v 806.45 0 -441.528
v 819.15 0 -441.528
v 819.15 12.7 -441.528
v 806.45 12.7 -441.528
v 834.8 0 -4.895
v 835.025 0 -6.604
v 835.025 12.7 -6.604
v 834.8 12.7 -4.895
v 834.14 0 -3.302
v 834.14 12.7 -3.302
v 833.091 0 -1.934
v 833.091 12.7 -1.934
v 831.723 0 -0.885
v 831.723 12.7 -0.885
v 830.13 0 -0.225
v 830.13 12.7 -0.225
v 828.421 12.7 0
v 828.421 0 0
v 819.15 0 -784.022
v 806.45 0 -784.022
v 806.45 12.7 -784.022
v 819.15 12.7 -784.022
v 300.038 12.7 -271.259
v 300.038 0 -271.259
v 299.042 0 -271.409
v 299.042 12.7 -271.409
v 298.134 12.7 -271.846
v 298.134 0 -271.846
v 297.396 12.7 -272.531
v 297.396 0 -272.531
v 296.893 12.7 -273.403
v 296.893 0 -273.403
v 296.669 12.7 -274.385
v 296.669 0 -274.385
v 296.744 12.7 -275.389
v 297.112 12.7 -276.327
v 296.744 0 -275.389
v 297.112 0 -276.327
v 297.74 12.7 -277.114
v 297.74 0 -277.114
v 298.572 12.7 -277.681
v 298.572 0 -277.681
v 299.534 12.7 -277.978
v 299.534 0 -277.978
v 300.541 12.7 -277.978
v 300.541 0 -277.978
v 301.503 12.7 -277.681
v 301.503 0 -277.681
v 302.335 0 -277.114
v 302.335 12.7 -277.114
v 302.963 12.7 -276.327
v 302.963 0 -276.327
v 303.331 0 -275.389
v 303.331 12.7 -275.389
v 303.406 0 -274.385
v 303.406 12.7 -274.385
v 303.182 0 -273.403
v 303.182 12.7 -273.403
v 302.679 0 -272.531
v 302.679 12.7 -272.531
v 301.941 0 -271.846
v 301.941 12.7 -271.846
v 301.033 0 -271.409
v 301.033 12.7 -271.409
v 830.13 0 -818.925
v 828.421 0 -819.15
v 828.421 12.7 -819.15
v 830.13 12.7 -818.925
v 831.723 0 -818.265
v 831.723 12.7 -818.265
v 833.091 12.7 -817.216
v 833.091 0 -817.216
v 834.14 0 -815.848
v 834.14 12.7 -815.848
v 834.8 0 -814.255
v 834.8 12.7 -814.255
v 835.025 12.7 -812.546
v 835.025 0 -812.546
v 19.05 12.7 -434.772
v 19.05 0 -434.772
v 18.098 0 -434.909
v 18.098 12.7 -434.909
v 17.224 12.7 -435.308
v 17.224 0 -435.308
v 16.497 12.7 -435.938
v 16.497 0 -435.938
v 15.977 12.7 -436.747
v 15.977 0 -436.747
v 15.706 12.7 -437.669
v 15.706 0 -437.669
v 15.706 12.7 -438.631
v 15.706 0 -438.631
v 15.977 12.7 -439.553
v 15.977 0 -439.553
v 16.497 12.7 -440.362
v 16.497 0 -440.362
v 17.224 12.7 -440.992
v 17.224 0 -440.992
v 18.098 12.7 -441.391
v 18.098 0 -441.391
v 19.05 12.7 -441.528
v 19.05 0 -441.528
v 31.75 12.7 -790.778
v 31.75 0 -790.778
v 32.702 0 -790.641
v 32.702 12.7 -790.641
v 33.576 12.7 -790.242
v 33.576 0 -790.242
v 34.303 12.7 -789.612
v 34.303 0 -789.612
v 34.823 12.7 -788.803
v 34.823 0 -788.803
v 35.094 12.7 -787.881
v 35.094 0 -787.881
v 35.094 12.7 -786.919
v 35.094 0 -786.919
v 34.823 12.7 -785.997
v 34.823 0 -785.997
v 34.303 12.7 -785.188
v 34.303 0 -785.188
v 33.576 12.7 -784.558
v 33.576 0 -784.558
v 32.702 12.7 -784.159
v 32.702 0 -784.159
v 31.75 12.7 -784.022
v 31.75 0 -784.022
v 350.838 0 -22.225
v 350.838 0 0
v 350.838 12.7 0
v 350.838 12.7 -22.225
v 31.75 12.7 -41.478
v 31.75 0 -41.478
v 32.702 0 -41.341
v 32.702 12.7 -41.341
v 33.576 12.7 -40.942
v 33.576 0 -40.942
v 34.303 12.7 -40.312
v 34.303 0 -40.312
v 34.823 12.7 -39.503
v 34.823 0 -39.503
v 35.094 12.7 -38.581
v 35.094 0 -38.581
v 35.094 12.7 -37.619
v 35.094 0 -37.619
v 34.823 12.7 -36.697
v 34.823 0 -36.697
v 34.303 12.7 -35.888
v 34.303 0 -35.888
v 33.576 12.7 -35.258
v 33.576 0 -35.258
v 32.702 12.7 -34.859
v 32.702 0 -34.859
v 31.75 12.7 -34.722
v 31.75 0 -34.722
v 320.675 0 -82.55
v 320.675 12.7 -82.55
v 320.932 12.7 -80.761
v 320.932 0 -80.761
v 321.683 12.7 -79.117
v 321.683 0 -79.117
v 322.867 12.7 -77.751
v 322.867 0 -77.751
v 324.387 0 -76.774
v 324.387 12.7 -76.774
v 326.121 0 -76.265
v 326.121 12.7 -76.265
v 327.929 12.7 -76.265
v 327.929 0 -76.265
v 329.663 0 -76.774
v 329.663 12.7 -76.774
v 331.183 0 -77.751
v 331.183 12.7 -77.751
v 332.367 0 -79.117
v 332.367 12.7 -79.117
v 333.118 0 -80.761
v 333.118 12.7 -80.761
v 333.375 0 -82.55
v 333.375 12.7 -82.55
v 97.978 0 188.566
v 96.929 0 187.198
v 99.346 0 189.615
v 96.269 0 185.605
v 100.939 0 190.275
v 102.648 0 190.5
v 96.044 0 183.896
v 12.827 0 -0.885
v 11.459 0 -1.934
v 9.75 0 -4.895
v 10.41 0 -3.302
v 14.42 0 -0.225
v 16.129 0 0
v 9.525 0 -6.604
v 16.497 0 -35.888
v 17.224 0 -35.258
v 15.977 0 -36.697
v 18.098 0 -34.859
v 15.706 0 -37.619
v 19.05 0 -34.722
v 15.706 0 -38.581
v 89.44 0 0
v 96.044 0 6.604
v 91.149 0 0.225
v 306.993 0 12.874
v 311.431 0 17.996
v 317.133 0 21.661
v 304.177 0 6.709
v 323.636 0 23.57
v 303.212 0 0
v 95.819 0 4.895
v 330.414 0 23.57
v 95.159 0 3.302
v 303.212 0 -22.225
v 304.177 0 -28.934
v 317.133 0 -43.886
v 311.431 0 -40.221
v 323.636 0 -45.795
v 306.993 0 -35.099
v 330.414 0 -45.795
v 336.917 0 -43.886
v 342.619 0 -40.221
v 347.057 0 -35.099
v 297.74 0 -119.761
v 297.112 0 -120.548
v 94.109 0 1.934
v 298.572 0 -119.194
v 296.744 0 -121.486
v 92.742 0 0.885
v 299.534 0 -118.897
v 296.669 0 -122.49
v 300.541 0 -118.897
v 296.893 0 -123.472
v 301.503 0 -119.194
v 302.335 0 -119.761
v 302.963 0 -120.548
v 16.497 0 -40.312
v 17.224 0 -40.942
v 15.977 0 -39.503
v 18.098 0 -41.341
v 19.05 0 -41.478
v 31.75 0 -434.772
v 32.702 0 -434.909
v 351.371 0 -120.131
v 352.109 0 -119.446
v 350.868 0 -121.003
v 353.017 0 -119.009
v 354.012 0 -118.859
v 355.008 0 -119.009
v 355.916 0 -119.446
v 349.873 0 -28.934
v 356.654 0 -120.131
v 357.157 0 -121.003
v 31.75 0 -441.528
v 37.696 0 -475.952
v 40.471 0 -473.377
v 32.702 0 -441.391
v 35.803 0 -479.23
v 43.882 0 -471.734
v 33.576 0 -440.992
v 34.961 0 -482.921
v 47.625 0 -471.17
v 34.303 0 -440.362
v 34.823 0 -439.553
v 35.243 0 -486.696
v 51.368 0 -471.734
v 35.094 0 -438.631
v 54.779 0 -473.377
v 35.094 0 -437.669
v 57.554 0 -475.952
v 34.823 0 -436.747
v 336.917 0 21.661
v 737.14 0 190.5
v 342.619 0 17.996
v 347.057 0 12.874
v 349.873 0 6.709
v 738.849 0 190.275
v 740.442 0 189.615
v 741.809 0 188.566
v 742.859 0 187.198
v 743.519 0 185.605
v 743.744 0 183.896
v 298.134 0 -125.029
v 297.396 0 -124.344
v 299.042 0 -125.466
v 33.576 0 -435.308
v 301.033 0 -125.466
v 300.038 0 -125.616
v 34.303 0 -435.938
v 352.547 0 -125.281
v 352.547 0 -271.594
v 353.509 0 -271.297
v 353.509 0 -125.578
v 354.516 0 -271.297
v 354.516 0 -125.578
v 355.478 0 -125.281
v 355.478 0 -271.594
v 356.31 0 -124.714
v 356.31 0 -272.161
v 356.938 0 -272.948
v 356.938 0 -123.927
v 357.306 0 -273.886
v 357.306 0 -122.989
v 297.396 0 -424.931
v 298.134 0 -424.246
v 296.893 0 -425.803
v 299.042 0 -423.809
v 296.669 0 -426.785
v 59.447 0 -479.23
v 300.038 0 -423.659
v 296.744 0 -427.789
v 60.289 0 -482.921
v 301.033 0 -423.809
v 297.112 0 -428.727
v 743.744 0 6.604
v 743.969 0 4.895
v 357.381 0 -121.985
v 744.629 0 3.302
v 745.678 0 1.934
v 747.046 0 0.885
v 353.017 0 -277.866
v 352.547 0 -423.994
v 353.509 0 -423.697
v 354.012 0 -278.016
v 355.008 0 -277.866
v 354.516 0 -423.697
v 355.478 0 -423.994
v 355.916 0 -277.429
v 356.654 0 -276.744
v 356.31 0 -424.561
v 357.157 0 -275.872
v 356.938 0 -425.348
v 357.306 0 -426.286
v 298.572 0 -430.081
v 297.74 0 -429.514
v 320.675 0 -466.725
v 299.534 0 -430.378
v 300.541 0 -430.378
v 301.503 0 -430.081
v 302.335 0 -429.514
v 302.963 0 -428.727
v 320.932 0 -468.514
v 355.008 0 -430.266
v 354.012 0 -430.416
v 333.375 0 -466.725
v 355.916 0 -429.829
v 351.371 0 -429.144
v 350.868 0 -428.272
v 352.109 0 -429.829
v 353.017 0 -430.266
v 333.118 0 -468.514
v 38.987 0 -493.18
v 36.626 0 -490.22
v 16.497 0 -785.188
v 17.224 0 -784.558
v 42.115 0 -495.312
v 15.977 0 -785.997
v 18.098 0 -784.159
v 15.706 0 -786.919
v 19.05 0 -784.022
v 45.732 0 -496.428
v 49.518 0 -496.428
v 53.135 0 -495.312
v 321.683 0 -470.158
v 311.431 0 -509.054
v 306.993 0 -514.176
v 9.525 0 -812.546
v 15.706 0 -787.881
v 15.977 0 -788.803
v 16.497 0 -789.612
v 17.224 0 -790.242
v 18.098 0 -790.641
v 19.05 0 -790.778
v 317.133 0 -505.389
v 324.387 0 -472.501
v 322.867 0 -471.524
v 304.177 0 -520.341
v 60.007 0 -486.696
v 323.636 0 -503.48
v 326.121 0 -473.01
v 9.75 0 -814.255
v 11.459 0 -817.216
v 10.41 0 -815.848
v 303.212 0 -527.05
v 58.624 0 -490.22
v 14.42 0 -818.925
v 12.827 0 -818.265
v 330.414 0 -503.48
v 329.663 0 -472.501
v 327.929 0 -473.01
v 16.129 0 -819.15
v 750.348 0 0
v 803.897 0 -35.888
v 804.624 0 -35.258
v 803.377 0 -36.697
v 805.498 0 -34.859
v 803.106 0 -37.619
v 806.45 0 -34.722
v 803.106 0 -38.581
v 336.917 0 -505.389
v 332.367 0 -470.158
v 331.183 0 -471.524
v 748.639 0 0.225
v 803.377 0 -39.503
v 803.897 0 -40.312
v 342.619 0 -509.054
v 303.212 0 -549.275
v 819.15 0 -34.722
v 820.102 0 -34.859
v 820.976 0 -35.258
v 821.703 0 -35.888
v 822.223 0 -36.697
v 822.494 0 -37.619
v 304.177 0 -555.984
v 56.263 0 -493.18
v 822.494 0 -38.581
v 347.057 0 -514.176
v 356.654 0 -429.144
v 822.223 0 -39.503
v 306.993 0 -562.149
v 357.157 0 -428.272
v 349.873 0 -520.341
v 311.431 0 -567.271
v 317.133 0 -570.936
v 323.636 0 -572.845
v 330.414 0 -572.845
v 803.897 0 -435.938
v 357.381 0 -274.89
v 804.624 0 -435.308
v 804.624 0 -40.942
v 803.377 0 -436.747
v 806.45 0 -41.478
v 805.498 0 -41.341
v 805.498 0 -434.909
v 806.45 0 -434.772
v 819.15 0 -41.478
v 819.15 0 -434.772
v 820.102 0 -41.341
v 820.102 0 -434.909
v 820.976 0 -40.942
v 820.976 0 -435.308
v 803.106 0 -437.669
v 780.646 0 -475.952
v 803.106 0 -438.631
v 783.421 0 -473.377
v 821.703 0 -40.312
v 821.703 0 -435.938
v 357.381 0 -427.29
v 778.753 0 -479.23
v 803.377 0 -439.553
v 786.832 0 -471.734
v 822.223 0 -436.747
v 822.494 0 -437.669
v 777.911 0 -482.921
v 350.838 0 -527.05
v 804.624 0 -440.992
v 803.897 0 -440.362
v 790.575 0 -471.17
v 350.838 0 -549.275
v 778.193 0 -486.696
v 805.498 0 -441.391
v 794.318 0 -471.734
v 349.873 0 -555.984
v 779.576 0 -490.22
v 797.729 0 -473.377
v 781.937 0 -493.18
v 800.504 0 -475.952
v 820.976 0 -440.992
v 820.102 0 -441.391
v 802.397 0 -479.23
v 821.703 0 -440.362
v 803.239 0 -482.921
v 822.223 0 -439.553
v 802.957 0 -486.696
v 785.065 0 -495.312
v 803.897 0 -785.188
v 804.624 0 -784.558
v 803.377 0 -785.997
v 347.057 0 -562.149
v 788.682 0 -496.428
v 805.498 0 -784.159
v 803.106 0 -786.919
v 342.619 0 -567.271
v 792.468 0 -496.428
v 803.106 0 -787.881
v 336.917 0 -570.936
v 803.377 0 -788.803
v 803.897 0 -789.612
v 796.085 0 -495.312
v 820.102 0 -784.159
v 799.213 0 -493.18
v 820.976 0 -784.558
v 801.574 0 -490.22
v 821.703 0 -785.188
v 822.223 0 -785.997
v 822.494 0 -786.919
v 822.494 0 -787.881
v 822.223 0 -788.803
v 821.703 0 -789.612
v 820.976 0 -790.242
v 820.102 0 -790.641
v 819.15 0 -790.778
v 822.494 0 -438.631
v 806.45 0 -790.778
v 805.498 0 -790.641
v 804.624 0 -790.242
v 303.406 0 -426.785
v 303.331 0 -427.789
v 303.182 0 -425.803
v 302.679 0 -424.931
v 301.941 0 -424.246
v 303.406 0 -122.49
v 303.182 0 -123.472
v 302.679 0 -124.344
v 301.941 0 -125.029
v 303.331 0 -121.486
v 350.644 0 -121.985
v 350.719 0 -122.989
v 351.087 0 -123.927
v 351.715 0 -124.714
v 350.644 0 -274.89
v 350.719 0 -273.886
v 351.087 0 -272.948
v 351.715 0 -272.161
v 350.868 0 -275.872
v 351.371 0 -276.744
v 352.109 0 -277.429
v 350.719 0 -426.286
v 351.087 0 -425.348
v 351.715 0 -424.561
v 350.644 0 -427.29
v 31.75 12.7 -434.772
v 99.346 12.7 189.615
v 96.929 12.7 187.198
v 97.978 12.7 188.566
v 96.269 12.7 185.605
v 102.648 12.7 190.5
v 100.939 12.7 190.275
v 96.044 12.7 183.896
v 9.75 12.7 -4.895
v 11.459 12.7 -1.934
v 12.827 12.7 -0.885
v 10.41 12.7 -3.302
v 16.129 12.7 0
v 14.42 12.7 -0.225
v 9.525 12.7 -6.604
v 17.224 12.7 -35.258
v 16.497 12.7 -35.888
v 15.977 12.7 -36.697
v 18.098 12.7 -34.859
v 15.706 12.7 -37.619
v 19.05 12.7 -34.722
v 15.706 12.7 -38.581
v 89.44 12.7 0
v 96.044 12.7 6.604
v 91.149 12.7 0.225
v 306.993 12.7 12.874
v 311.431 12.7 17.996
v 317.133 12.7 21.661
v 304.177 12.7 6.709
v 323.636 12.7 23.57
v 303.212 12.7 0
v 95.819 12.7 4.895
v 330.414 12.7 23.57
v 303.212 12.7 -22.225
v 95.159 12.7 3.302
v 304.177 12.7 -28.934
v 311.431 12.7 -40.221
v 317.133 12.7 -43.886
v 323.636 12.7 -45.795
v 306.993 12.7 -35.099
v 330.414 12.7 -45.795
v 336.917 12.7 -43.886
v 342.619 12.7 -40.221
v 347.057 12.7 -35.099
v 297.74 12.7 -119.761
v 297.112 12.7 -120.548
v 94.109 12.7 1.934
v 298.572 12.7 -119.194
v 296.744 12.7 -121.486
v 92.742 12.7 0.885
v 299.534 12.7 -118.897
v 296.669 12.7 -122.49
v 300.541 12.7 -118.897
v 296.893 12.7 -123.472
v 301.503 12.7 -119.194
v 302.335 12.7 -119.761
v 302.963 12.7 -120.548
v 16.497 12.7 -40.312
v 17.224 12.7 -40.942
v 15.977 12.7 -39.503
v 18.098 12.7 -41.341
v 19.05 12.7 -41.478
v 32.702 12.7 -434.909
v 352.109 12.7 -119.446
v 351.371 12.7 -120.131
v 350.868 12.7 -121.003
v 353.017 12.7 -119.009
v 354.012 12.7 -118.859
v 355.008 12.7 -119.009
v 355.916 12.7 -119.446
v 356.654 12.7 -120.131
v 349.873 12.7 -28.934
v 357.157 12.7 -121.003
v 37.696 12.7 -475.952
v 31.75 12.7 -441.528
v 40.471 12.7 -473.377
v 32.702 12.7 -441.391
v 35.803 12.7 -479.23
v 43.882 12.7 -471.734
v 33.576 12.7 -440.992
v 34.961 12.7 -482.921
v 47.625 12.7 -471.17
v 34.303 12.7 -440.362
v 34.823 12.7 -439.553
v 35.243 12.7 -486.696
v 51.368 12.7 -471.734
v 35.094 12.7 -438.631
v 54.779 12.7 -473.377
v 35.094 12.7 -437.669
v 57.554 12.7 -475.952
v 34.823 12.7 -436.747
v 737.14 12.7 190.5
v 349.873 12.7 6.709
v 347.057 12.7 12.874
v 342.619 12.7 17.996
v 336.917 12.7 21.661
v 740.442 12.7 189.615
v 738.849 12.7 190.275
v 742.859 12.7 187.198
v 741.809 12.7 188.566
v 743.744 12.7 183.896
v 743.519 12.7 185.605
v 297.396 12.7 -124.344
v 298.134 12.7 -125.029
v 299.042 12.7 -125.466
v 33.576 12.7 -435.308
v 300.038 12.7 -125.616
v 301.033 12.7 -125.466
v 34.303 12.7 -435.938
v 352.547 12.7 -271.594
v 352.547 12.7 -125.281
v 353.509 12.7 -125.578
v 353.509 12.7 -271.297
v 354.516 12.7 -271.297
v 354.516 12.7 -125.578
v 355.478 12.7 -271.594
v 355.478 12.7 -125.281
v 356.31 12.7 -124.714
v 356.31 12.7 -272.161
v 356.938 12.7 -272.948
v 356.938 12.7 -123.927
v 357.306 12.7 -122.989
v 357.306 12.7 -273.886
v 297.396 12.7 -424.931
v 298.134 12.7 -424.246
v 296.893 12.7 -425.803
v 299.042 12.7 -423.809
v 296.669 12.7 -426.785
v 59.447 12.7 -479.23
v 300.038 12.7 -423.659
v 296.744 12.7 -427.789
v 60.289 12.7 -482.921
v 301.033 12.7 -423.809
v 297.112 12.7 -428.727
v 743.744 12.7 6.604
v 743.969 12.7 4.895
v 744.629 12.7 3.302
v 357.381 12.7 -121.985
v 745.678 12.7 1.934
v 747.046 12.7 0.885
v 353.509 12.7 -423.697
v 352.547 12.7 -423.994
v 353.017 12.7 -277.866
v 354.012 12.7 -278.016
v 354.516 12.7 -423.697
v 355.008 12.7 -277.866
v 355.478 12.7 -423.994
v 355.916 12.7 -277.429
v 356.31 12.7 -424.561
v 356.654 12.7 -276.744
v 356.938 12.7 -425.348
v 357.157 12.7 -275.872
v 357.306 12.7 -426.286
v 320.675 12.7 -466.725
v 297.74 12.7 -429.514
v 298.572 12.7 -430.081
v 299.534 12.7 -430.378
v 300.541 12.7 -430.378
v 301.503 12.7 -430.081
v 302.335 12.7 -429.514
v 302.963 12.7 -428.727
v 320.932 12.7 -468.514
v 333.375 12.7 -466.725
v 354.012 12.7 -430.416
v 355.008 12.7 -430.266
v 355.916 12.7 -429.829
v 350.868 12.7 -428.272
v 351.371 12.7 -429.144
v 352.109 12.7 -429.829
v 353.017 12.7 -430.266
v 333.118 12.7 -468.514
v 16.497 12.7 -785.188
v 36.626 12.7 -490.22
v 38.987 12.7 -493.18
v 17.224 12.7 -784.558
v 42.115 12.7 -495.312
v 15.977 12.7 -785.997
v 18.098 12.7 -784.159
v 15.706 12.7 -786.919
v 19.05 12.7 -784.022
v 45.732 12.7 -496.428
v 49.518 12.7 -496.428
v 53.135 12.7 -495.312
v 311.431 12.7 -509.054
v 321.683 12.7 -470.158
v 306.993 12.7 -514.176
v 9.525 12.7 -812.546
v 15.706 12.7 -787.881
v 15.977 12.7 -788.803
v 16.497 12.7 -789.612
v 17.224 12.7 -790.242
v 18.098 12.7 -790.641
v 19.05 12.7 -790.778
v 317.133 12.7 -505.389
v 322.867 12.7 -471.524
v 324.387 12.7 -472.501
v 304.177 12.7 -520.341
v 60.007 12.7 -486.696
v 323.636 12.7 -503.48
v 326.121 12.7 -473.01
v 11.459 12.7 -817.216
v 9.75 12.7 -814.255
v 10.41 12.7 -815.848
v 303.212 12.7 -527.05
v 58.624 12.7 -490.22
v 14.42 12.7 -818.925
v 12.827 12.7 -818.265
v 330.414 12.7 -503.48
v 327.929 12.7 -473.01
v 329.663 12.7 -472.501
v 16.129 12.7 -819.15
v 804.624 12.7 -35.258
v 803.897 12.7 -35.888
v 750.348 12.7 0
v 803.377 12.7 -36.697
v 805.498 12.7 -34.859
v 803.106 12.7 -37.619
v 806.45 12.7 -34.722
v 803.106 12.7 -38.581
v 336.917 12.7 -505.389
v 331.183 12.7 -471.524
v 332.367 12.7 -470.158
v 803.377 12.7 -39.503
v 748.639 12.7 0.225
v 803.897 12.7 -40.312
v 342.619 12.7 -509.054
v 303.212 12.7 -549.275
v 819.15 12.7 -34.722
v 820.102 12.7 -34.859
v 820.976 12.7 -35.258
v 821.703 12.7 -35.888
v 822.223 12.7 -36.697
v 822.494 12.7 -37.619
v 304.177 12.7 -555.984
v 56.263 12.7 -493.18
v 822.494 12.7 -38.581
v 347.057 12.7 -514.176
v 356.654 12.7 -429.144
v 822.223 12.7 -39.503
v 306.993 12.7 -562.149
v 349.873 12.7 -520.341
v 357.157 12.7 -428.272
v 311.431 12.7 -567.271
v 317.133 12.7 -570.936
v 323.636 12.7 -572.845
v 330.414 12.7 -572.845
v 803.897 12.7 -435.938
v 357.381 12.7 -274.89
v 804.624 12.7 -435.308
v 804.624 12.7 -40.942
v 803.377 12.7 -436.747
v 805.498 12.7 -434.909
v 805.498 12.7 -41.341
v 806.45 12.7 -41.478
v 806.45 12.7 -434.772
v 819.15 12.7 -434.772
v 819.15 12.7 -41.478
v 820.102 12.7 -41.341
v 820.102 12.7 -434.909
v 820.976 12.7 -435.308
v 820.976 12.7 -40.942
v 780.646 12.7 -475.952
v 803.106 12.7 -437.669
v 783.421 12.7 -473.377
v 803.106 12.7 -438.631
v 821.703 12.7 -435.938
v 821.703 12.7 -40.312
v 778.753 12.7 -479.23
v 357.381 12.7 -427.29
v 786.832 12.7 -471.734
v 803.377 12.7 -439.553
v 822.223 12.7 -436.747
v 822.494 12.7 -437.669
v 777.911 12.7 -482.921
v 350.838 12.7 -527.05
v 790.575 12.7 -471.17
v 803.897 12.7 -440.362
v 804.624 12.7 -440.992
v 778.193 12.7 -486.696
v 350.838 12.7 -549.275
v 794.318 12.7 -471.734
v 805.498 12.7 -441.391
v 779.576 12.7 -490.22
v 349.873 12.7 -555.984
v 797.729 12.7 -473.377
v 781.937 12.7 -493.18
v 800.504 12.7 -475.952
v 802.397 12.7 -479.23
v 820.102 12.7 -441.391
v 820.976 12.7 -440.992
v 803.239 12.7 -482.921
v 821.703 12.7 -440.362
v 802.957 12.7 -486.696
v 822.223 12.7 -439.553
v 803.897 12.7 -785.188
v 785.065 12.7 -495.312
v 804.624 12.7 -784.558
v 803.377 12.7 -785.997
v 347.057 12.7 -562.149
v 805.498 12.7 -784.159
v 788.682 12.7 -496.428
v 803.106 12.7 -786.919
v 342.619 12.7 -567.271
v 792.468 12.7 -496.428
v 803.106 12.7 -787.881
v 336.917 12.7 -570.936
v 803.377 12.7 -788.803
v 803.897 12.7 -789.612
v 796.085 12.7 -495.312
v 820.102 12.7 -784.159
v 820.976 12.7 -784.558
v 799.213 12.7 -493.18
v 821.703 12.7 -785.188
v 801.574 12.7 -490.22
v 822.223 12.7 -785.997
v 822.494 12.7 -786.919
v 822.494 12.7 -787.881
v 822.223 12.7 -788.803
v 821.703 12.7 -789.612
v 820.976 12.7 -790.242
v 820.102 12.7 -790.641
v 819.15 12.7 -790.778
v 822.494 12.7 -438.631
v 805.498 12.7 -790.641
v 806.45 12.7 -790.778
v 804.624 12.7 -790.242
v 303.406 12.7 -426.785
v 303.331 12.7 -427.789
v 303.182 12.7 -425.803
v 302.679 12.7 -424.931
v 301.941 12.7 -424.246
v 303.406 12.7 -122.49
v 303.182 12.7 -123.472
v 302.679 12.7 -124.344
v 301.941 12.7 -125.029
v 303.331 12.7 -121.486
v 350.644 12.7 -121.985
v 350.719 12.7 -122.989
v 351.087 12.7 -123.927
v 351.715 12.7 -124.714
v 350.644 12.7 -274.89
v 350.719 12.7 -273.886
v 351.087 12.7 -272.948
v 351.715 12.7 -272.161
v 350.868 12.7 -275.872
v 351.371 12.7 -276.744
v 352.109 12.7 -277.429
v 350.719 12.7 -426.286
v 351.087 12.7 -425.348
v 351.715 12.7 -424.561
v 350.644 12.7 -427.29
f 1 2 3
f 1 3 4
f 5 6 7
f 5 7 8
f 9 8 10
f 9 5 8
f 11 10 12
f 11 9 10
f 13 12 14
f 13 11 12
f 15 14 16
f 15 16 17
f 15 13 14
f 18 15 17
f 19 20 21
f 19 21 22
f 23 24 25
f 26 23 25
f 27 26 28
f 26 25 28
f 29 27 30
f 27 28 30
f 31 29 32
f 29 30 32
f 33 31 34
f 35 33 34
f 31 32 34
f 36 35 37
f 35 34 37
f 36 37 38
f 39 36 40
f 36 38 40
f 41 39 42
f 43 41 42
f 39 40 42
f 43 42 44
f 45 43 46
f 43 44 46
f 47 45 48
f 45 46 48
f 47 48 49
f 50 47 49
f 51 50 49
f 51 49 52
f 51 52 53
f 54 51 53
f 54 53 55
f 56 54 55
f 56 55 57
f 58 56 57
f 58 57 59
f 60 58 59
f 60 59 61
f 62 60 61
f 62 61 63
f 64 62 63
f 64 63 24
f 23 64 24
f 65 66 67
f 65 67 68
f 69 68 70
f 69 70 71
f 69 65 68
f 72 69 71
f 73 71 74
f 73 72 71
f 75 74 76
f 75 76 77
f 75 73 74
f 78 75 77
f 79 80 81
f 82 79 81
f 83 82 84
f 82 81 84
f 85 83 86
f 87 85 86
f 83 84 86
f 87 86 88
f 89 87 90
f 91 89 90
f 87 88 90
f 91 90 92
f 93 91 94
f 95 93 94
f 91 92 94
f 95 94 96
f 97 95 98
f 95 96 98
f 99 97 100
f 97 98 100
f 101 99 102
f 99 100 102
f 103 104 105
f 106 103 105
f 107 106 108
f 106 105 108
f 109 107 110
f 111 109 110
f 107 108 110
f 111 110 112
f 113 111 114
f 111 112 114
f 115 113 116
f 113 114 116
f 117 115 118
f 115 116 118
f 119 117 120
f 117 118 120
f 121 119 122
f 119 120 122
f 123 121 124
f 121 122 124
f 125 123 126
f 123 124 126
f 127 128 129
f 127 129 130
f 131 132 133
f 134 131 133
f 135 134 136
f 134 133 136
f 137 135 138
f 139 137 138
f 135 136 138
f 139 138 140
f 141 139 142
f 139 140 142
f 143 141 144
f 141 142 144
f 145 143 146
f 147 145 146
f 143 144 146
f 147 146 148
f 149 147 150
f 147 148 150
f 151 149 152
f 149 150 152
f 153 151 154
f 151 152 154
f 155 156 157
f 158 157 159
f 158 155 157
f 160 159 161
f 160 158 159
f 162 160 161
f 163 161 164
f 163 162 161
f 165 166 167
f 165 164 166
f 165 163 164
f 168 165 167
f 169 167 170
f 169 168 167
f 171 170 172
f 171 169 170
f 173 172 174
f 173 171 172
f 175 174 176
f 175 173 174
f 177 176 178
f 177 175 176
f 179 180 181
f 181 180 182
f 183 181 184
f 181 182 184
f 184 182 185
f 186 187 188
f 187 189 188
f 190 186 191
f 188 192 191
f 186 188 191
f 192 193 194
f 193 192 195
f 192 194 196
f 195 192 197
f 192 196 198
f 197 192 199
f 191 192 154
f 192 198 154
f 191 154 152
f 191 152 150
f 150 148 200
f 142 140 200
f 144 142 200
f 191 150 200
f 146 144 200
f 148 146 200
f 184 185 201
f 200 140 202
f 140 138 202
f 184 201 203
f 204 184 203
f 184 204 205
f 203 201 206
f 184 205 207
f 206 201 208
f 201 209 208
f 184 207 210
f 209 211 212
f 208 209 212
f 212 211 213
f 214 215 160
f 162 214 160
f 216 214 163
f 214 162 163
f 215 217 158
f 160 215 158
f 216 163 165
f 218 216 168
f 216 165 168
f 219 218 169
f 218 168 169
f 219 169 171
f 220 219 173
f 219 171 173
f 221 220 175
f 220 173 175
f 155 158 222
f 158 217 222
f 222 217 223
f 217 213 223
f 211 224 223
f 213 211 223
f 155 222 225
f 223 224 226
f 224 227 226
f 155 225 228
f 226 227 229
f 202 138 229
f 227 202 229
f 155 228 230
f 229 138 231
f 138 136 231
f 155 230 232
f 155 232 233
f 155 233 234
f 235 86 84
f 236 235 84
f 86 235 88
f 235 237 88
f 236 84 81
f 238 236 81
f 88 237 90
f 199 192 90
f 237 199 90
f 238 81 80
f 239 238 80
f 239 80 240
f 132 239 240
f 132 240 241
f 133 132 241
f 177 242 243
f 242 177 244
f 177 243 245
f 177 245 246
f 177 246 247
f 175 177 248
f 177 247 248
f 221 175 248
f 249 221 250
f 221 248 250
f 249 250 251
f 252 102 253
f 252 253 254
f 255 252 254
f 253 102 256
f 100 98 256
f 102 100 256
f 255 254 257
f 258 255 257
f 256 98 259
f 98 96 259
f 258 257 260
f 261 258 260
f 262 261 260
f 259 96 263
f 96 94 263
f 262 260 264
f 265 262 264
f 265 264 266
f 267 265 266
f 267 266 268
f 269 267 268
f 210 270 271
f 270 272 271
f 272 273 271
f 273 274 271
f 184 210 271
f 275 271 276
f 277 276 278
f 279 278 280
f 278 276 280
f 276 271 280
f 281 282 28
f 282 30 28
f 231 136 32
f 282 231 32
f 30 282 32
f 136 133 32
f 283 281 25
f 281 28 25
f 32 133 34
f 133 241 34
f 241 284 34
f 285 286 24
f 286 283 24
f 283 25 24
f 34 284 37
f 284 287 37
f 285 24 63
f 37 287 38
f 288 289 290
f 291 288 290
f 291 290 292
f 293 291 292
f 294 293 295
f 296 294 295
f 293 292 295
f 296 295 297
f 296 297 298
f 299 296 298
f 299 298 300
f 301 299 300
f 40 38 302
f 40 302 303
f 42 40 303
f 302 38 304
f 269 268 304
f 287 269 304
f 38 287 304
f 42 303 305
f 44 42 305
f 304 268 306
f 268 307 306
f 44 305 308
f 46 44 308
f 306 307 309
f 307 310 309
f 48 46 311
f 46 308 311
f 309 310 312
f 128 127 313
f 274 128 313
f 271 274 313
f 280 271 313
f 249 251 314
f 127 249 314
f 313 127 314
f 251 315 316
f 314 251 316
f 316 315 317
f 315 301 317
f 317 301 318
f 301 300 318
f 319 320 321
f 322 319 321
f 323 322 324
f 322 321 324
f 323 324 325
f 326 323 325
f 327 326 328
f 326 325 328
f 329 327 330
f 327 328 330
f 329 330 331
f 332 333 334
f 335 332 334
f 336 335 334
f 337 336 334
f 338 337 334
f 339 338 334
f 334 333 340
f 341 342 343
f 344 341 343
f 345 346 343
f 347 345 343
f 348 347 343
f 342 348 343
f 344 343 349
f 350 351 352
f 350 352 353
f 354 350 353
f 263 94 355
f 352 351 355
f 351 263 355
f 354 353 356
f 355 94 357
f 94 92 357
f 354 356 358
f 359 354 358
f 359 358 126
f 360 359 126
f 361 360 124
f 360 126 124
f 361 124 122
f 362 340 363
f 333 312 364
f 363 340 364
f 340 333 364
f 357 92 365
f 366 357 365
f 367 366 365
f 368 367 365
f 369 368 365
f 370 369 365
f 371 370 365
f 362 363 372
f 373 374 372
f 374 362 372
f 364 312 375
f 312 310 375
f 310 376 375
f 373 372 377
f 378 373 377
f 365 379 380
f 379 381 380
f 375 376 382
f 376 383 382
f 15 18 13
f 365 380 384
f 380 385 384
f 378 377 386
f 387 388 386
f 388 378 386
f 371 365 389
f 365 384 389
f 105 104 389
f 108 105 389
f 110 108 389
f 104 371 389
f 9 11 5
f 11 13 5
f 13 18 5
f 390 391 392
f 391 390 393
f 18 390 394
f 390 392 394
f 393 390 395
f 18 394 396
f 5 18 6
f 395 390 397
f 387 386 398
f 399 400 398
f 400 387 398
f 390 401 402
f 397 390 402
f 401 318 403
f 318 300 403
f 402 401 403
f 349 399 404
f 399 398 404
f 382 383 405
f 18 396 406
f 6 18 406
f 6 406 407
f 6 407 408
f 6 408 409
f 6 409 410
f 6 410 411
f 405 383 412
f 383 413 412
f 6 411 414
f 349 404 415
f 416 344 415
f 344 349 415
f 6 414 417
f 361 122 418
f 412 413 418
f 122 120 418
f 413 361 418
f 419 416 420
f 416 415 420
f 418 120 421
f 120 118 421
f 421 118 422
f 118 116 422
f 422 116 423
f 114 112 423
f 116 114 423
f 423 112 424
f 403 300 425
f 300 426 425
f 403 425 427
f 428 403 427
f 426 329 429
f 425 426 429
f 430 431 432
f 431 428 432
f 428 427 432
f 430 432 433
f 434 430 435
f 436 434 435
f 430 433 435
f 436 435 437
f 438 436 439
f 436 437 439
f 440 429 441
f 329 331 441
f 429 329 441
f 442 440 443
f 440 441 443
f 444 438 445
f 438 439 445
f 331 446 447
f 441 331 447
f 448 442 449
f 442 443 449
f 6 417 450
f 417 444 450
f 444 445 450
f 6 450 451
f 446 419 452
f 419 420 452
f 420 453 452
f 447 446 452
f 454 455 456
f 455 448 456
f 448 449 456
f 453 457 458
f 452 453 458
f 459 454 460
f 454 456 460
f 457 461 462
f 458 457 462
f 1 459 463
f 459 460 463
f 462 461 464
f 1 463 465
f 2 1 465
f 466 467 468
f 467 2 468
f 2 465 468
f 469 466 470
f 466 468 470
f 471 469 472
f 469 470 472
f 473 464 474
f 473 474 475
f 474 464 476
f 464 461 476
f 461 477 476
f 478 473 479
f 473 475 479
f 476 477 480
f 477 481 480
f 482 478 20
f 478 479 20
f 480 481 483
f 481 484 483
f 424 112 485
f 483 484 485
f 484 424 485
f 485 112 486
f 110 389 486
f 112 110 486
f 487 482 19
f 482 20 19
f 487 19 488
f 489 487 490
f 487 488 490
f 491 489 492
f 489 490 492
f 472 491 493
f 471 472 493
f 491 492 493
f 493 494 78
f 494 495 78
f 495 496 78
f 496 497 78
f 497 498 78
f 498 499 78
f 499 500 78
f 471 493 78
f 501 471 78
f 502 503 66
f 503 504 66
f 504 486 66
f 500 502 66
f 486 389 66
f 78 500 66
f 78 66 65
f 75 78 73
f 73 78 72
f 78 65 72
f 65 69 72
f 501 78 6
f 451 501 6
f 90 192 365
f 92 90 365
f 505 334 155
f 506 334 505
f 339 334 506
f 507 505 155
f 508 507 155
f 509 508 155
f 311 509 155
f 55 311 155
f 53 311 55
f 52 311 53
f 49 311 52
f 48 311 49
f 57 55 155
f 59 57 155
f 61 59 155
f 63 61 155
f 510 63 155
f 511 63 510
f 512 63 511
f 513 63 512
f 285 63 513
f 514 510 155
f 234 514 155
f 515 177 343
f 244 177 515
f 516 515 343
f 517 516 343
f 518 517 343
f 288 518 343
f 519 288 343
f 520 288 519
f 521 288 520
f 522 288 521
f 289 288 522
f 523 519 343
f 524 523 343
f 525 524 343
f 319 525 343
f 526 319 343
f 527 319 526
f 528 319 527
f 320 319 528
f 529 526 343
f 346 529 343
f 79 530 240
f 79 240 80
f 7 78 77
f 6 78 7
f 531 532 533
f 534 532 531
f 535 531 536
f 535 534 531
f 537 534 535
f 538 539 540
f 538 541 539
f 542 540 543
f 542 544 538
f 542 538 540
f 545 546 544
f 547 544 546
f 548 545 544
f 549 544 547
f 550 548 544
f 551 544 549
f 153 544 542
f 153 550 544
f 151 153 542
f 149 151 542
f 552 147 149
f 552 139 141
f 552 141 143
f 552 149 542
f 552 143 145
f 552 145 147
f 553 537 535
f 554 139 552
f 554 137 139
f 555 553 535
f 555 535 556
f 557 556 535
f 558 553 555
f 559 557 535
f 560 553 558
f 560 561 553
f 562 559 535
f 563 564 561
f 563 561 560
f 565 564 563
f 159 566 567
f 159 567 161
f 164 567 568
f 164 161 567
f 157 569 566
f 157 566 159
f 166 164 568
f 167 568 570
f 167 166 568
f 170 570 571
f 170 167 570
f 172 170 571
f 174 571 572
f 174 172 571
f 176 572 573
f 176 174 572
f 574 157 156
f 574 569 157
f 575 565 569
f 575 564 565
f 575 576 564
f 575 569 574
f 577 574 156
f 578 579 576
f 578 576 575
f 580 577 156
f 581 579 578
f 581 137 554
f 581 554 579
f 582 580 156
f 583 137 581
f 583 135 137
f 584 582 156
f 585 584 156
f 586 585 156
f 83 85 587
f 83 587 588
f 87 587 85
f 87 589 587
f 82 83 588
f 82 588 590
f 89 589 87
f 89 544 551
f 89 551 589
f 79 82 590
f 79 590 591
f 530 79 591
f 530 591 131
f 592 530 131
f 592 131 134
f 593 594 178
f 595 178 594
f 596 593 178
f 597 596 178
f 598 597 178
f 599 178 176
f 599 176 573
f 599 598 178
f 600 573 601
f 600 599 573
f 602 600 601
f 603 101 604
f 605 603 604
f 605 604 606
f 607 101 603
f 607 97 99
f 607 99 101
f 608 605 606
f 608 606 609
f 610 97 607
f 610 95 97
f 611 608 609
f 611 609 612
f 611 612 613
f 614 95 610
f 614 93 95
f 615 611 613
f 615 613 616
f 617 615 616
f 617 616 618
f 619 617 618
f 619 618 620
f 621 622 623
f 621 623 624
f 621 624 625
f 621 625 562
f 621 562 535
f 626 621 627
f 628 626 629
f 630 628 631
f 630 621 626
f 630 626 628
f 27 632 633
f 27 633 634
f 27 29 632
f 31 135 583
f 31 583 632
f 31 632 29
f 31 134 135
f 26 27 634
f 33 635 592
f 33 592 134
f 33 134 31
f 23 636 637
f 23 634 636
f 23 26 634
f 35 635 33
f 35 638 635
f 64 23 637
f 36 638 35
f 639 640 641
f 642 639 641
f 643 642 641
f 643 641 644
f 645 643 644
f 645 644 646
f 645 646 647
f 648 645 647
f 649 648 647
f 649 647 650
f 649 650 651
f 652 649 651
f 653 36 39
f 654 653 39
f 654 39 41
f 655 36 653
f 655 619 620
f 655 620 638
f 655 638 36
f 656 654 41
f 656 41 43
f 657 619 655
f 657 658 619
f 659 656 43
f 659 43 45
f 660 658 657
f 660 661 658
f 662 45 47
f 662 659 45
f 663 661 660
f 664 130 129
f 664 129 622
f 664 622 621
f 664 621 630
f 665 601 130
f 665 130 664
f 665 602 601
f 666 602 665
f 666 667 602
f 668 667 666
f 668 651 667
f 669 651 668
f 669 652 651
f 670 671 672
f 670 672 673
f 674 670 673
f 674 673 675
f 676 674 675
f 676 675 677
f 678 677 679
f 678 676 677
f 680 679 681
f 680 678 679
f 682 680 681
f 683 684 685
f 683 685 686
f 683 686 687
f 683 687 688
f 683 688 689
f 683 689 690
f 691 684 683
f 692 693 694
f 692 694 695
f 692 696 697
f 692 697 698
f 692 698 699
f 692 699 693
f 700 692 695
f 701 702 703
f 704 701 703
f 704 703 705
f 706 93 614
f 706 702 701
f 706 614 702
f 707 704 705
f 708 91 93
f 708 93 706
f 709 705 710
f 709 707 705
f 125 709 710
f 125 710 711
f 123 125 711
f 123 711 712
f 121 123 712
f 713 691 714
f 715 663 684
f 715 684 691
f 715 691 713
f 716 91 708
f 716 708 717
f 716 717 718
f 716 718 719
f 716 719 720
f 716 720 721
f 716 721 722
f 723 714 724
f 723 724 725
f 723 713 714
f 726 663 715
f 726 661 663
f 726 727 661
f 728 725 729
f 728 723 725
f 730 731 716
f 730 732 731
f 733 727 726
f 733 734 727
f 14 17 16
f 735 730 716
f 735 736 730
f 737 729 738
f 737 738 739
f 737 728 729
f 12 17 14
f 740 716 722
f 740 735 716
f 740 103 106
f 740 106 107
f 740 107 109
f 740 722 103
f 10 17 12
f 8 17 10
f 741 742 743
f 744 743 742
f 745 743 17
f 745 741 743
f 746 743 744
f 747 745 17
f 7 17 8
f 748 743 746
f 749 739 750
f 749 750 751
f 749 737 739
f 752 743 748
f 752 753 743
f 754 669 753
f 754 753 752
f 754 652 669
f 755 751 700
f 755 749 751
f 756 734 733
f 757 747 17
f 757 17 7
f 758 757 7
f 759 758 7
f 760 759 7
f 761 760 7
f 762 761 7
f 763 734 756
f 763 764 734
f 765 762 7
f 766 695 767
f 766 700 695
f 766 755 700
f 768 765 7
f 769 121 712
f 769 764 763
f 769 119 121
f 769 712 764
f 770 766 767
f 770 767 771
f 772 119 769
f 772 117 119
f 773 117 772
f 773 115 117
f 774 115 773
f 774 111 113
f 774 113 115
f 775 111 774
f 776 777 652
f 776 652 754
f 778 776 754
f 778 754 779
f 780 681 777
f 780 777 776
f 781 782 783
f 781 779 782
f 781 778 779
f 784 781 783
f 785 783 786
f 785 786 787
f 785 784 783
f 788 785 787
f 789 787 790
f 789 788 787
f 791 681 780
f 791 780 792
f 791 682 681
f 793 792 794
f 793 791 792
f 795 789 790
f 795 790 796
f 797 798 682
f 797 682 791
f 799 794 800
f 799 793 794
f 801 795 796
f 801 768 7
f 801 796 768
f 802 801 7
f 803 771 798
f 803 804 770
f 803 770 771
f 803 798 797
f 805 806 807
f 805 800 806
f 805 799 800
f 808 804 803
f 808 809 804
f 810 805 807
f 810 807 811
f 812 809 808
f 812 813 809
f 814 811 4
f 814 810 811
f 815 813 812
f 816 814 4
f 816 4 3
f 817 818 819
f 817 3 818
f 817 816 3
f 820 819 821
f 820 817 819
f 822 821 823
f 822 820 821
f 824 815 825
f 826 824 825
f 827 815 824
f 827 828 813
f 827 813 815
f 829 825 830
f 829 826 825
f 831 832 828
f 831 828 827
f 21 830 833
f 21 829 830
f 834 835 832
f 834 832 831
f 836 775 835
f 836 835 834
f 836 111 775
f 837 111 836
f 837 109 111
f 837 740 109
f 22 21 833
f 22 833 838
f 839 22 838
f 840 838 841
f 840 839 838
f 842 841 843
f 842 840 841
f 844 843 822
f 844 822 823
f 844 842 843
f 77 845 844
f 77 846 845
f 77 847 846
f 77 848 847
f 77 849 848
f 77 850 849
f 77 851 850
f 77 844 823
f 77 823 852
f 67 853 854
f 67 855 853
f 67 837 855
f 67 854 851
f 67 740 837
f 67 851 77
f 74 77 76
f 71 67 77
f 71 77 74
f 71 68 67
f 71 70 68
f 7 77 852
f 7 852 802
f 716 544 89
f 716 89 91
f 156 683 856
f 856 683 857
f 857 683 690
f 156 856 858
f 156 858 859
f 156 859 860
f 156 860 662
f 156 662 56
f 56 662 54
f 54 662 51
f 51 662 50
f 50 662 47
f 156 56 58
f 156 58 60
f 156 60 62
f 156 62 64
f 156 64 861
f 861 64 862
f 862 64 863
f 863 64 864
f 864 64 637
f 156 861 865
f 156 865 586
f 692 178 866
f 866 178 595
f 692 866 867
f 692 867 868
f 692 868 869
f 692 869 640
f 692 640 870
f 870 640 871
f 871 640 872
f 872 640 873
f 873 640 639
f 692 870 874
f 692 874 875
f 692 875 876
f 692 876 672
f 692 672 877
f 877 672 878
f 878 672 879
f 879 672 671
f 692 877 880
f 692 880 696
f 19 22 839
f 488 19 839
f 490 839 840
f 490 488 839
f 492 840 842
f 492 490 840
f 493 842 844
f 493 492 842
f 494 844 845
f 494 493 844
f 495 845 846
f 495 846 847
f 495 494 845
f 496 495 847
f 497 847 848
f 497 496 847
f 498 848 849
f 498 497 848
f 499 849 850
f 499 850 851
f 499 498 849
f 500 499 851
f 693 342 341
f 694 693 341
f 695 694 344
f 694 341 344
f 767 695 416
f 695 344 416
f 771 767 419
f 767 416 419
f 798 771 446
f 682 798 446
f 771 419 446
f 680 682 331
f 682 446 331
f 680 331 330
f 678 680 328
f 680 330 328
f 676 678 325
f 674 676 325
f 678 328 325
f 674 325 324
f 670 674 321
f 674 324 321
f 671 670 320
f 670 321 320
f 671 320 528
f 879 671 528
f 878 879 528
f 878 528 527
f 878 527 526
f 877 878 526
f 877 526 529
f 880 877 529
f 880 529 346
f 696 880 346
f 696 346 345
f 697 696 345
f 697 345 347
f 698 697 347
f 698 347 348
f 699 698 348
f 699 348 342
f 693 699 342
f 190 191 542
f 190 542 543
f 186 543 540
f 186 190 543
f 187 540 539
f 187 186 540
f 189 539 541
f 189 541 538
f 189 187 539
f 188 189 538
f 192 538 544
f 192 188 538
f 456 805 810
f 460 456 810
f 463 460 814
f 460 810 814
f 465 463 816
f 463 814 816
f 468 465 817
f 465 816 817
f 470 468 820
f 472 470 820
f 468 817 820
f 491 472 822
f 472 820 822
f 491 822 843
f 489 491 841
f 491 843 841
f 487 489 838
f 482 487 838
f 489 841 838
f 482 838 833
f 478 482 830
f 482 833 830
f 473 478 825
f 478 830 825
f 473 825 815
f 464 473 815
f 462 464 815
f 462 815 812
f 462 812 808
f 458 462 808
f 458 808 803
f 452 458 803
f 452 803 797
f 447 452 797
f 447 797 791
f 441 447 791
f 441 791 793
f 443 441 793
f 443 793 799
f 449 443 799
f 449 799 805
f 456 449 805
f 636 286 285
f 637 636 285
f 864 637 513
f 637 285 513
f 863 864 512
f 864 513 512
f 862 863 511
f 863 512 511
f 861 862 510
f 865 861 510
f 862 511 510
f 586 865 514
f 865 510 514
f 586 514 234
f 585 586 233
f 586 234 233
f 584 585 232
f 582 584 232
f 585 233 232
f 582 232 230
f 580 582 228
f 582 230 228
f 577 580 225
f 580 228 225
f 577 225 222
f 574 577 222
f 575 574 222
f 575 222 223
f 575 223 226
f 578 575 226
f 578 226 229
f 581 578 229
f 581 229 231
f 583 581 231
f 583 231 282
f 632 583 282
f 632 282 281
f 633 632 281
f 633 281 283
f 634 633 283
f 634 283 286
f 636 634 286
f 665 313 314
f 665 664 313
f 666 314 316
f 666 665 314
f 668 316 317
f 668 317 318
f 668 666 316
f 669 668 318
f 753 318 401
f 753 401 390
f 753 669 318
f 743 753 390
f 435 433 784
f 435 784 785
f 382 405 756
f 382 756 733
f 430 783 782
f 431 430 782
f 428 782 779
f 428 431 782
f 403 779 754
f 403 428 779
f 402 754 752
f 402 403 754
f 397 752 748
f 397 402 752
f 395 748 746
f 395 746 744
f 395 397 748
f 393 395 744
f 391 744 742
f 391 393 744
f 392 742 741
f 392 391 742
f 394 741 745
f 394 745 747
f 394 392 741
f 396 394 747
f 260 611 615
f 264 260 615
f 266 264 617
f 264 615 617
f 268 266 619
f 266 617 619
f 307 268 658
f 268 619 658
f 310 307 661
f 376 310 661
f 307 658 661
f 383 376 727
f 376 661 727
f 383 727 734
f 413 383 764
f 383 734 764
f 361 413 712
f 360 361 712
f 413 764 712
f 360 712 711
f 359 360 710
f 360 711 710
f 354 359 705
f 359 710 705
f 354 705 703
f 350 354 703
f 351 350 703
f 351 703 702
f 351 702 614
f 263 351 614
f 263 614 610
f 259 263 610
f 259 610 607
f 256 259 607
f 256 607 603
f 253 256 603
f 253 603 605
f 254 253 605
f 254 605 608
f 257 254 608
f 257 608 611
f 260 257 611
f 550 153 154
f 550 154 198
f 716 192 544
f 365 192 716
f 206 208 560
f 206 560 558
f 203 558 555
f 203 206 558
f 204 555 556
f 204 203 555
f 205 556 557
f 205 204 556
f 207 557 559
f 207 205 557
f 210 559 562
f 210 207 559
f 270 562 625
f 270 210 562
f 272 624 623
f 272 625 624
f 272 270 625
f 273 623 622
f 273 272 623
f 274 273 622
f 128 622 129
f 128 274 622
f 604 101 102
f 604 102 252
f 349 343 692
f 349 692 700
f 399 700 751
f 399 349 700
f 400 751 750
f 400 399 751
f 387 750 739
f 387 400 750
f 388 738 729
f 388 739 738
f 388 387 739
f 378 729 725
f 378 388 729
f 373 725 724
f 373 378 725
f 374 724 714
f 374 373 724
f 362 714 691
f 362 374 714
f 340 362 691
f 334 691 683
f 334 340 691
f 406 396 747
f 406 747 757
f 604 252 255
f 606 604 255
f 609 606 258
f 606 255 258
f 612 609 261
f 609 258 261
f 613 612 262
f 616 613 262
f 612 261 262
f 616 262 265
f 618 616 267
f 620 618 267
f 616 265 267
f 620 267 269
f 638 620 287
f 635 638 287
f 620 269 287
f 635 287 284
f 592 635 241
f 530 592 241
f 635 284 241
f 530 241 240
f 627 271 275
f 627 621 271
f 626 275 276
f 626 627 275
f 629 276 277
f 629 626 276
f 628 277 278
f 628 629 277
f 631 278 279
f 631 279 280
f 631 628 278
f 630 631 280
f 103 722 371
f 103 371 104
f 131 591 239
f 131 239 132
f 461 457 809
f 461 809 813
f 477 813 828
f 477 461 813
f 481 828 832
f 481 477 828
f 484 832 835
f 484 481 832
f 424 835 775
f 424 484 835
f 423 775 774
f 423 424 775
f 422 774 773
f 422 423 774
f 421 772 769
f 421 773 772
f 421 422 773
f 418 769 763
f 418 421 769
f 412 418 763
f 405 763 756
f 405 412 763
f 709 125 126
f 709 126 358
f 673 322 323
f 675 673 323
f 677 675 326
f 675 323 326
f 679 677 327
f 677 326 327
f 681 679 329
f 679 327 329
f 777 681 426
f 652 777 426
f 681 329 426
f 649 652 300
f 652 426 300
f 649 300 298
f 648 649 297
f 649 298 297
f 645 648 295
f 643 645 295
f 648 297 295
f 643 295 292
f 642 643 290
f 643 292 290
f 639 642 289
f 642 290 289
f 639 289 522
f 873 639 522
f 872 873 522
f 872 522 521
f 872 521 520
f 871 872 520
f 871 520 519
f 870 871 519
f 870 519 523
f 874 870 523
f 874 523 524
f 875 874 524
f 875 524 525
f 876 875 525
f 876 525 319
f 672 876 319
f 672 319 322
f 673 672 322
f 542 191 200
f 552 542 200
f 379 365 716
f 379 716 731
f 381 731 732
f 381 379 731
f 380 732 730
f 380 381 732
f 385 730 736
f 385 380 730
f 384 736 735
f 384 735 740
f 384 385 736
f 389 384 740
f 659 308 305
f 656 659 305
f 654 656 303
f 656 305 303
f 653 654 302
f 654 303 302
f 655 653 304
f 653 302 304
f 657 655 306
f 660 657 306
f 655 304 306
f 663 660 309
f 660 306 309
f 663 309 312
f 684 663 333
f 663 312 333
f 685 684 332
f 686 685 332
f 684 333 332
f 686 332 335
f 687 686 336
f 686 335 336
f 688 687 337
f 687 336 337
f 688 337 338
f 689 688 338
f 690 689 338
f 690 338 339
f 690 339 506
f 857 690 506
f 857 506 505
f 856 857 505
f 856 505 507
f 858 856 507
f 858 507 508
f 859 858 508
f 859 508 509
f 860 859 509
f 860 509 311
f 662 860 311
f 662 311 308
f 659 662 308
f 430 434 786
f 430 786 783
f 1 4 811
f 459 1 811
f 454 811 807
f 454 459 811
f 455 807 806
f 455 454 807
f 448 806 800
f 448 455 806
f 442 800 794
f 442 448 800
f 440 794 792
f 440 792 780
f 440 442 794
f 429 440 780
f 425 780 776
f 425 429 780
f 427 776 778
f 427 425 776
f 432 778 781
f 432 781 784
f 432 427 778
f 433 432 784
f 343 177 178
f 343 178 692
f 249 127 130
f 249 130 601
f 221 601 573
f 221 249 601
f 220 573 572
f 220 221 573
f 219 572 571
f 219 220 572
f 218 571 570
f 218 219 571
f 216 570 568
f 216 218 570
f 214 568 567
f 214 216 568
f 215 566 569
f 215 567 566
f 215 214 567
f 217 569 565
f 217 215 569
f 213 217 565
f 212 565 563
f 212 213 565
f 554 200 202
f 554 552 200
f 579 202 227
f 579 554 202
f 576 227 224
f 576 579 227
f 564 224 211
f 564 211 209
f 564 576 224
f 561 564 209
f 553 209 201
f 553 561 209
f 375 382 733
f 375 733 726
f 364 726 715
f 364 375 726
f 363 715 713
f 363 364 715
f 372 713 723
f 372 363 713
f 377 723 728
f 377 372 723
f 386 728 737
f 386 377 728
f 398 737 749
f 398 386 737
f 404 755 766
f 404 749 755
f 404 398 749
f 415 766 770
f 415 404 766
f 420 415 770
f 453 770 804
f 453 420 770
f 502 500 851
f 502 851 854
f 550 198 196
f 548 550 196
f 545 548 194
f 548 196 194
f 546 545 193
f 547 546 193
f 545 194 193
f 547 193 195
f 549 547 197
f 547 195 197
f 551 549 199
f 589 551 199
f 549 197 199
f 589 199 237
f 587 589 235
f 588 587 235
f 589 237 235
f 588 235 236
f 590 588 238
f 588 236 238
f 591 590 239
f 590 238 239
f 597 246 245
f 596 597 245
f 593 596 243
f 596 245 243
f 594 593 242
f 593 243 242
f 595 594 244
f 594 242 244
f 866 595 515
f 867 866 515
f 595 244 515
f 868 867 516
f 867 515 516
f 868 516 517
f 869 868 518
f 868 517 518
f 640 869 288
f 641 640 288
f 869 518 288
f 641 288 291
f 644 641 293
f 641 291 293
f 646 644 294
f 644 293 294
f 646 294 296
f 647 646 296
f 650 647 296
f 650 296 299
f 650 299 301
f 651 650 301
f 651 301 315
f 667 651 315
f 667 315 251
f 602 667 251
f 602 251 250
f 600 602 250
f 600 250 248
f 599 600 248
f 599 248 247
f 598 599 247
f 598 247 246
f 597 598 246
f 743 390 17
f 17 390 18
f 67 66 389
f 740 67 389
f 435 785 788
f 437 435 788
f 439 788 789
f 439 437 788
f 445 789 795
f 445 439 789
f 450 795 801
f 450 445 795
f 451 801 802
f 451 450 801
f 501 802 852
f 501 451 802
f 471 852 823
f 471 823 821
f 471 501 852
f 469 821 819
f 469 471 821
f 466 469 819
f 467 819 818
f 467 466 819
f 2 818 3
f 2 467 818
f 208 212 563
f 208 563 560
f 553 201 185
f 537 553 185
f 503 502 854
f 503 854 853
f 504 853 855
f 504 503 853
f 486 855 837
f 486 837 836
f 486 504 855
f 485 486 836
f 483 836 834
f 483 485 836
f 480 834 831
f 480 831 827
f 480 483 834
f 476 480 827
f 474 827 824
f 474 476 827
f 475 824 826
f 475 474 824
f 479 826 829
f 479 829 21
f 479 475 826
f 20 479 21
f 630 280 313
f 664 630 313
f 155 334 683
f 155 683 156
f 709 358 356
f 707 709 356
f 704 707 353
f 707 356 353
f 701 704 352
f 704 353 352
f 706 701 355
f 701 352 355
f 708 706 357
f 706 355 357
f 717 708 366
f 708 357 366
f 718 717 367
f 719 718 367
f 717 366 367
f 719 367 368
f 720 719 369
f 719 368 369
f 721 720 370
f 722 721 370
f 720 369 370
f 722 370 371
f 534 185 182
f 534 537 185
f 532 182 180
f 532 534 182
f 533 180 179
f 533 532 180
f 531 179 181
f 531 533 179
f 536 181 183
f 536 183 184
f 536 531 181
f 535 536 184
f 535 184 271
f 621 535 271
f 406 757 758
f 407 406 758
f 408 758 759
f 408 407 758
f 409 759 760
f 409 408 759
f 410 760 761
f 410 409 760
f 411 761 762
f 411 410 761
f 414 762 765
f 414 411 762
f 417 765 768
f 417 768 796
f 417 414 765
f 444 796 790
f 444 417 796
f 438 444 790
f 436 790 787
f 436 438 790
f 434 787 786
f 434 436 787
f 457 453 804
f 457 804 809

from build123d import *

# Parameters (mm, degrees)
BOSS_EXTRUDE1_DEPTH = 12.7
FILLET1_R           = 6.604
FILLET2_R           = 6.604
SKETCH2_R           = 12.7
CUT_EXTRUDE1_DEPTH  = 1173.069644902
CUT_EXTRUDE3_DEPTH  = 1173.069644902
CUT_EXTRUDE4_DEPTH  = 1173.069644902
SKETCH6_R           = 3.3782
CUT_EXTRUDE5_DEPTH  = 1173.069644902
CUT_EXTRUDE6_DEPTH  = 1173.069644902


with BuildPart() as part:
    # Sketch1 → Boss-Extrude1 (new body)
    with BuildSketch(Plane(origin=(0, 0, 0), x_dir=(1, 0, 0), z_dir=(0, 1, 0))):
        Polygon((0, 0), (96.04375, 0), (96.04375, -190.5), (743.74375, -190.5), (743.74375, 0), (838.2, 0), (838.2, 819.15), (0, 819.15), align=None)
        with BuildLine():
            Line((19.05, 41.4782), (31.75, 41.4782))
            ThreePointArc((31.75, 41.4782), (35.1282, 38.1), (31.75, 34.7218))
            Line((31.75, 34.7218), (19.05, 34.7218))
            ThreePointArc((19.05, 34.7218), (15.6718, 38.1), (19.05, 41.4782))
        make_face(mode=Mode.SUBTRACT)
        with BuildLine():
            Line((19.05, 441.5282), (31.75, 441.5282))
            ThreePointArc((31.75, 441.5282), (35.1282, 438.15), (31.75, 434.7718))
            Line((31.75, 434.7718), (19.05, 434.7718))
            ThreePointArc((19.05, 434.7718), (15.6718, 438.15), (19.05, 441.5282))
        make_face(mode=Mode.SUBTRACT)
        with BuildLine():
            Line((31.75, 784.0218), (19.05, 784.0218))
            ThreePointArc((19.05, 784.0218), (15.6718, 787.4), (19.05, 790.7782))
            Line((19.05, 790.7782), (31.75, 790.7782))
            ThreePointArc((31.75, 790.7782), (35.1282, 787.4), (31.75, 784.0218))
        make_face(mode=Mode.SUBTRACT)
        with BuildLine():
            Line((806.45, 784.0218), (819.15, 784.0218))
            ThreePointArc((819.15, 784.0218), (822.5282, 787.4), (819.15, 790.7782))
            Line((819.15, 790.7782), (806.45, 790.7782))
            ThreePointArc((806.45, 790.7782), (803.0718, 787.4), (806.45, 784.0218))
        make_face(mode=Mode.SUBTRACT)
        with BuildLine():
            Line((819.15, 441.5282), (806.45, 441.5282))
            ThreePointArc((806.45, 441.5282), (803.0718, 438.15), (806.45, 434.7718))
            Line((806.45, 434.7718), (819.15, 434.7718))
            ThreePointArc((819.15, 434.7718), (822.5282, 438.15), (819.15, 441.5282))
        make_face(mode=Mode.SUBTRACT)
        with BuildLine():
            Line((819.15, 41.4782), (806.45, 41.4782))
            ThreePointArc((806.45, 41.4782), (803.0718, 38.1), (806.45, 34.7218))
            Line((806.45, 34.7218), (819.15, 34.7218))
            ThreePointArc((819.15, 34.7218), (822.5282, 38.1), (819.15, 41.4782))
        make_face(mode=Mode.SUBTRACT)
    extrude(amount=BOSS_EXTRUDE1_DEPTH)

    # Fillet1
    fillet1_edges = [part.edges().sort_by_distance(p)[0] for p in [
        (743.74375, 6.35, 0),
        (96.04375, 6.35, 0),
    ]]
    fillet(fillet1_edges, radius=FILLET1_R)

    # Fillet2
    fillet2_edges = [part.edges().sort_by_distance(p)[0] for p in [
        (0, 6.35, -819.15),
        (838.2, 6.35, -819.15),
        (838.2, 6.35, 0),
        (743.74375, 6.35, 190.5),
        (96.04375, 6.35, 190.5),
        (0, 6.35, 0),
    ]]
    fillet(fillet2_edges, radius=FILLET2_R)

    # Sketch2 → Cut-Extrude1 (cut, through all)
    with BuildSketch(Plane(origin=(0, 12.7, 0), x_dir=(1, 0, 0), z_dir=(0, 1, 0))):
        with Locations(Location((47.625, 483.87, 0), (0, 0, 270))):
            Circle(SKETCH2_R)
        with Locations(Location((790.575, 483.87, 0), (0, 0, 270))):
            Circle(SKETCH2_R)
    extrude(amount=-CUT_EXTRUDE1_DEPTH, mode=Mode.SUBTRACT)

    # Sketch4 → Cut-Extrude3 (cut, through all)
    with BuildSketch(Plane.XZ):
        with BuildLine():
            Line((350.8375, -527.05), (350.8375, -549.275))
            ThreePointArc((350.8375, -549.275), (327.025, -573.0875), (303.2125, -549.275))
            Line((303.2125, -549.275), (303.2125, -527.05))
            ThreePointArc((303.2125, -527.05), (327.025, -503.2375), (350.8375, -527.05))
        make_face()
        with BuildLine():
            Line((350.8375, 0), (350.8375, -22.225))
            ThreePointArc((350.8375, -22.225), (327.025, -46.0375), (303.2125, -22.225))
            Line((303.2125, -22.225), (303.2125, 0))
            ThreePointArc((303.2125, 0), (327.025, 23.8125), (350.8375, 0))
        make_face()
    extrude(amount=-CUT_EXTRUDE3_DEPTH, mode=Mode.SUBTRACT)

    # Sketch5 → Cut-Extrude4 (cut, through all)
    with BuildSketch(Plane.XZ):
        with BuildLine():
            Line((320.675, -466.725), (320.675, -82.55))
            ThreePointArc((320.675, -82.55), (327.025, -76.2), (333.375, -82.55))
            Line((333.375, -82.55), (333.375, -466.725))
            ThreePointArc((333.375, -466.725), (327.025, -473.075), (320.675, -466.725))
        make_face()
    extrude(amount=-CUT_EXTRUDE4_DEPTH, mode=Mode.SUBTRACT)

    # Sketch6 → Cut-Extrude5 (cut, through all)
    with BuildSketch(Plane.XZ):
        with Locations(Location((354.0125, -274.6375, 0), (0, 0, 270))):
            Circle(SKETCH6_R)
        with Locations(Location((354.0125, -427.0375, 0), (0, 0, 270))):
            Circle(SKETCH6_R)
        with Locations(Location((354.0125, -122.2375, 0), (0, 0, 90))):
            Circle(SKETCH6_R)
        with Locations(Location((300.0375, -427.0375, 0), (0, 0, 90))):
            Circle(SKETCH6_R)
        with Locations(Location((300.0375, -274.6375, 0), (0, 0, 90))):
            Circle(SKETCH6_R)
        with Locations(Location((300.0375, -122.2375, 0), (0, 0, 270))):
            Circle(SKETCH6_R)
    extrude(amount=-CUT_EXTRUDE5_DEPTH, mode=Mode.SUBTRACT)

    # Sketch7 → Cut-Extrude6 (cut, through all)
    with BuildSketch(Plane.XZ):
        with BuildLine():
            ThreePointArc((828.421, -819.15), (833.090733183, -817.215733183), (835.025, -812.546))
            Line((835.025, -812.546), (835.025, -6.604))
            ThreePointArc((835.025, -6.604), (833.090733183, -1.934266817), (828.421, 0))
            Line((828.421, 0), (831.596, 0))
            ThreePointArc((831.596, 0), (836.265733183, -1.934266817), (838.2, -6.604))
            Line((838.2, -6.604), (838.2, -812.546))
            ThreePointArc((838.2, -812.546), (836.265733183, -817.215733183), (831.596, -819.15))
            Line((831.596, -819.15), (828.421, -819.15))
        make_face()
        with BuildLine():
            ThreePointArc((9.525, -812.546), (11.459266817, -817.215733183), (16.129, -819.15))
            Line((16.129, -819.15), (6.604, -819.15))
            ThreePointArc((6.604, -819.15), (1.934266817, -817.215733183), (0, -812.546))
            Line((0, -812.546), (0, -6.604))
            ThreePointArc((0, -6.604), (1.934266817, -1.934266817), (6.604, 0))
            Line((6.604, 0), (16.129, 0))
            ThreePointArc((16.129, 0), (11.459266817, -1.934266817), (9.525, -6.604))
            Line((9.525, -6.604), (9.525, -812.546))
        make_face()
    extrude(amount=-CUT_EXTRUDE6_DEPTH, mode=Mode.SUBTRACT)


solid = part.part
